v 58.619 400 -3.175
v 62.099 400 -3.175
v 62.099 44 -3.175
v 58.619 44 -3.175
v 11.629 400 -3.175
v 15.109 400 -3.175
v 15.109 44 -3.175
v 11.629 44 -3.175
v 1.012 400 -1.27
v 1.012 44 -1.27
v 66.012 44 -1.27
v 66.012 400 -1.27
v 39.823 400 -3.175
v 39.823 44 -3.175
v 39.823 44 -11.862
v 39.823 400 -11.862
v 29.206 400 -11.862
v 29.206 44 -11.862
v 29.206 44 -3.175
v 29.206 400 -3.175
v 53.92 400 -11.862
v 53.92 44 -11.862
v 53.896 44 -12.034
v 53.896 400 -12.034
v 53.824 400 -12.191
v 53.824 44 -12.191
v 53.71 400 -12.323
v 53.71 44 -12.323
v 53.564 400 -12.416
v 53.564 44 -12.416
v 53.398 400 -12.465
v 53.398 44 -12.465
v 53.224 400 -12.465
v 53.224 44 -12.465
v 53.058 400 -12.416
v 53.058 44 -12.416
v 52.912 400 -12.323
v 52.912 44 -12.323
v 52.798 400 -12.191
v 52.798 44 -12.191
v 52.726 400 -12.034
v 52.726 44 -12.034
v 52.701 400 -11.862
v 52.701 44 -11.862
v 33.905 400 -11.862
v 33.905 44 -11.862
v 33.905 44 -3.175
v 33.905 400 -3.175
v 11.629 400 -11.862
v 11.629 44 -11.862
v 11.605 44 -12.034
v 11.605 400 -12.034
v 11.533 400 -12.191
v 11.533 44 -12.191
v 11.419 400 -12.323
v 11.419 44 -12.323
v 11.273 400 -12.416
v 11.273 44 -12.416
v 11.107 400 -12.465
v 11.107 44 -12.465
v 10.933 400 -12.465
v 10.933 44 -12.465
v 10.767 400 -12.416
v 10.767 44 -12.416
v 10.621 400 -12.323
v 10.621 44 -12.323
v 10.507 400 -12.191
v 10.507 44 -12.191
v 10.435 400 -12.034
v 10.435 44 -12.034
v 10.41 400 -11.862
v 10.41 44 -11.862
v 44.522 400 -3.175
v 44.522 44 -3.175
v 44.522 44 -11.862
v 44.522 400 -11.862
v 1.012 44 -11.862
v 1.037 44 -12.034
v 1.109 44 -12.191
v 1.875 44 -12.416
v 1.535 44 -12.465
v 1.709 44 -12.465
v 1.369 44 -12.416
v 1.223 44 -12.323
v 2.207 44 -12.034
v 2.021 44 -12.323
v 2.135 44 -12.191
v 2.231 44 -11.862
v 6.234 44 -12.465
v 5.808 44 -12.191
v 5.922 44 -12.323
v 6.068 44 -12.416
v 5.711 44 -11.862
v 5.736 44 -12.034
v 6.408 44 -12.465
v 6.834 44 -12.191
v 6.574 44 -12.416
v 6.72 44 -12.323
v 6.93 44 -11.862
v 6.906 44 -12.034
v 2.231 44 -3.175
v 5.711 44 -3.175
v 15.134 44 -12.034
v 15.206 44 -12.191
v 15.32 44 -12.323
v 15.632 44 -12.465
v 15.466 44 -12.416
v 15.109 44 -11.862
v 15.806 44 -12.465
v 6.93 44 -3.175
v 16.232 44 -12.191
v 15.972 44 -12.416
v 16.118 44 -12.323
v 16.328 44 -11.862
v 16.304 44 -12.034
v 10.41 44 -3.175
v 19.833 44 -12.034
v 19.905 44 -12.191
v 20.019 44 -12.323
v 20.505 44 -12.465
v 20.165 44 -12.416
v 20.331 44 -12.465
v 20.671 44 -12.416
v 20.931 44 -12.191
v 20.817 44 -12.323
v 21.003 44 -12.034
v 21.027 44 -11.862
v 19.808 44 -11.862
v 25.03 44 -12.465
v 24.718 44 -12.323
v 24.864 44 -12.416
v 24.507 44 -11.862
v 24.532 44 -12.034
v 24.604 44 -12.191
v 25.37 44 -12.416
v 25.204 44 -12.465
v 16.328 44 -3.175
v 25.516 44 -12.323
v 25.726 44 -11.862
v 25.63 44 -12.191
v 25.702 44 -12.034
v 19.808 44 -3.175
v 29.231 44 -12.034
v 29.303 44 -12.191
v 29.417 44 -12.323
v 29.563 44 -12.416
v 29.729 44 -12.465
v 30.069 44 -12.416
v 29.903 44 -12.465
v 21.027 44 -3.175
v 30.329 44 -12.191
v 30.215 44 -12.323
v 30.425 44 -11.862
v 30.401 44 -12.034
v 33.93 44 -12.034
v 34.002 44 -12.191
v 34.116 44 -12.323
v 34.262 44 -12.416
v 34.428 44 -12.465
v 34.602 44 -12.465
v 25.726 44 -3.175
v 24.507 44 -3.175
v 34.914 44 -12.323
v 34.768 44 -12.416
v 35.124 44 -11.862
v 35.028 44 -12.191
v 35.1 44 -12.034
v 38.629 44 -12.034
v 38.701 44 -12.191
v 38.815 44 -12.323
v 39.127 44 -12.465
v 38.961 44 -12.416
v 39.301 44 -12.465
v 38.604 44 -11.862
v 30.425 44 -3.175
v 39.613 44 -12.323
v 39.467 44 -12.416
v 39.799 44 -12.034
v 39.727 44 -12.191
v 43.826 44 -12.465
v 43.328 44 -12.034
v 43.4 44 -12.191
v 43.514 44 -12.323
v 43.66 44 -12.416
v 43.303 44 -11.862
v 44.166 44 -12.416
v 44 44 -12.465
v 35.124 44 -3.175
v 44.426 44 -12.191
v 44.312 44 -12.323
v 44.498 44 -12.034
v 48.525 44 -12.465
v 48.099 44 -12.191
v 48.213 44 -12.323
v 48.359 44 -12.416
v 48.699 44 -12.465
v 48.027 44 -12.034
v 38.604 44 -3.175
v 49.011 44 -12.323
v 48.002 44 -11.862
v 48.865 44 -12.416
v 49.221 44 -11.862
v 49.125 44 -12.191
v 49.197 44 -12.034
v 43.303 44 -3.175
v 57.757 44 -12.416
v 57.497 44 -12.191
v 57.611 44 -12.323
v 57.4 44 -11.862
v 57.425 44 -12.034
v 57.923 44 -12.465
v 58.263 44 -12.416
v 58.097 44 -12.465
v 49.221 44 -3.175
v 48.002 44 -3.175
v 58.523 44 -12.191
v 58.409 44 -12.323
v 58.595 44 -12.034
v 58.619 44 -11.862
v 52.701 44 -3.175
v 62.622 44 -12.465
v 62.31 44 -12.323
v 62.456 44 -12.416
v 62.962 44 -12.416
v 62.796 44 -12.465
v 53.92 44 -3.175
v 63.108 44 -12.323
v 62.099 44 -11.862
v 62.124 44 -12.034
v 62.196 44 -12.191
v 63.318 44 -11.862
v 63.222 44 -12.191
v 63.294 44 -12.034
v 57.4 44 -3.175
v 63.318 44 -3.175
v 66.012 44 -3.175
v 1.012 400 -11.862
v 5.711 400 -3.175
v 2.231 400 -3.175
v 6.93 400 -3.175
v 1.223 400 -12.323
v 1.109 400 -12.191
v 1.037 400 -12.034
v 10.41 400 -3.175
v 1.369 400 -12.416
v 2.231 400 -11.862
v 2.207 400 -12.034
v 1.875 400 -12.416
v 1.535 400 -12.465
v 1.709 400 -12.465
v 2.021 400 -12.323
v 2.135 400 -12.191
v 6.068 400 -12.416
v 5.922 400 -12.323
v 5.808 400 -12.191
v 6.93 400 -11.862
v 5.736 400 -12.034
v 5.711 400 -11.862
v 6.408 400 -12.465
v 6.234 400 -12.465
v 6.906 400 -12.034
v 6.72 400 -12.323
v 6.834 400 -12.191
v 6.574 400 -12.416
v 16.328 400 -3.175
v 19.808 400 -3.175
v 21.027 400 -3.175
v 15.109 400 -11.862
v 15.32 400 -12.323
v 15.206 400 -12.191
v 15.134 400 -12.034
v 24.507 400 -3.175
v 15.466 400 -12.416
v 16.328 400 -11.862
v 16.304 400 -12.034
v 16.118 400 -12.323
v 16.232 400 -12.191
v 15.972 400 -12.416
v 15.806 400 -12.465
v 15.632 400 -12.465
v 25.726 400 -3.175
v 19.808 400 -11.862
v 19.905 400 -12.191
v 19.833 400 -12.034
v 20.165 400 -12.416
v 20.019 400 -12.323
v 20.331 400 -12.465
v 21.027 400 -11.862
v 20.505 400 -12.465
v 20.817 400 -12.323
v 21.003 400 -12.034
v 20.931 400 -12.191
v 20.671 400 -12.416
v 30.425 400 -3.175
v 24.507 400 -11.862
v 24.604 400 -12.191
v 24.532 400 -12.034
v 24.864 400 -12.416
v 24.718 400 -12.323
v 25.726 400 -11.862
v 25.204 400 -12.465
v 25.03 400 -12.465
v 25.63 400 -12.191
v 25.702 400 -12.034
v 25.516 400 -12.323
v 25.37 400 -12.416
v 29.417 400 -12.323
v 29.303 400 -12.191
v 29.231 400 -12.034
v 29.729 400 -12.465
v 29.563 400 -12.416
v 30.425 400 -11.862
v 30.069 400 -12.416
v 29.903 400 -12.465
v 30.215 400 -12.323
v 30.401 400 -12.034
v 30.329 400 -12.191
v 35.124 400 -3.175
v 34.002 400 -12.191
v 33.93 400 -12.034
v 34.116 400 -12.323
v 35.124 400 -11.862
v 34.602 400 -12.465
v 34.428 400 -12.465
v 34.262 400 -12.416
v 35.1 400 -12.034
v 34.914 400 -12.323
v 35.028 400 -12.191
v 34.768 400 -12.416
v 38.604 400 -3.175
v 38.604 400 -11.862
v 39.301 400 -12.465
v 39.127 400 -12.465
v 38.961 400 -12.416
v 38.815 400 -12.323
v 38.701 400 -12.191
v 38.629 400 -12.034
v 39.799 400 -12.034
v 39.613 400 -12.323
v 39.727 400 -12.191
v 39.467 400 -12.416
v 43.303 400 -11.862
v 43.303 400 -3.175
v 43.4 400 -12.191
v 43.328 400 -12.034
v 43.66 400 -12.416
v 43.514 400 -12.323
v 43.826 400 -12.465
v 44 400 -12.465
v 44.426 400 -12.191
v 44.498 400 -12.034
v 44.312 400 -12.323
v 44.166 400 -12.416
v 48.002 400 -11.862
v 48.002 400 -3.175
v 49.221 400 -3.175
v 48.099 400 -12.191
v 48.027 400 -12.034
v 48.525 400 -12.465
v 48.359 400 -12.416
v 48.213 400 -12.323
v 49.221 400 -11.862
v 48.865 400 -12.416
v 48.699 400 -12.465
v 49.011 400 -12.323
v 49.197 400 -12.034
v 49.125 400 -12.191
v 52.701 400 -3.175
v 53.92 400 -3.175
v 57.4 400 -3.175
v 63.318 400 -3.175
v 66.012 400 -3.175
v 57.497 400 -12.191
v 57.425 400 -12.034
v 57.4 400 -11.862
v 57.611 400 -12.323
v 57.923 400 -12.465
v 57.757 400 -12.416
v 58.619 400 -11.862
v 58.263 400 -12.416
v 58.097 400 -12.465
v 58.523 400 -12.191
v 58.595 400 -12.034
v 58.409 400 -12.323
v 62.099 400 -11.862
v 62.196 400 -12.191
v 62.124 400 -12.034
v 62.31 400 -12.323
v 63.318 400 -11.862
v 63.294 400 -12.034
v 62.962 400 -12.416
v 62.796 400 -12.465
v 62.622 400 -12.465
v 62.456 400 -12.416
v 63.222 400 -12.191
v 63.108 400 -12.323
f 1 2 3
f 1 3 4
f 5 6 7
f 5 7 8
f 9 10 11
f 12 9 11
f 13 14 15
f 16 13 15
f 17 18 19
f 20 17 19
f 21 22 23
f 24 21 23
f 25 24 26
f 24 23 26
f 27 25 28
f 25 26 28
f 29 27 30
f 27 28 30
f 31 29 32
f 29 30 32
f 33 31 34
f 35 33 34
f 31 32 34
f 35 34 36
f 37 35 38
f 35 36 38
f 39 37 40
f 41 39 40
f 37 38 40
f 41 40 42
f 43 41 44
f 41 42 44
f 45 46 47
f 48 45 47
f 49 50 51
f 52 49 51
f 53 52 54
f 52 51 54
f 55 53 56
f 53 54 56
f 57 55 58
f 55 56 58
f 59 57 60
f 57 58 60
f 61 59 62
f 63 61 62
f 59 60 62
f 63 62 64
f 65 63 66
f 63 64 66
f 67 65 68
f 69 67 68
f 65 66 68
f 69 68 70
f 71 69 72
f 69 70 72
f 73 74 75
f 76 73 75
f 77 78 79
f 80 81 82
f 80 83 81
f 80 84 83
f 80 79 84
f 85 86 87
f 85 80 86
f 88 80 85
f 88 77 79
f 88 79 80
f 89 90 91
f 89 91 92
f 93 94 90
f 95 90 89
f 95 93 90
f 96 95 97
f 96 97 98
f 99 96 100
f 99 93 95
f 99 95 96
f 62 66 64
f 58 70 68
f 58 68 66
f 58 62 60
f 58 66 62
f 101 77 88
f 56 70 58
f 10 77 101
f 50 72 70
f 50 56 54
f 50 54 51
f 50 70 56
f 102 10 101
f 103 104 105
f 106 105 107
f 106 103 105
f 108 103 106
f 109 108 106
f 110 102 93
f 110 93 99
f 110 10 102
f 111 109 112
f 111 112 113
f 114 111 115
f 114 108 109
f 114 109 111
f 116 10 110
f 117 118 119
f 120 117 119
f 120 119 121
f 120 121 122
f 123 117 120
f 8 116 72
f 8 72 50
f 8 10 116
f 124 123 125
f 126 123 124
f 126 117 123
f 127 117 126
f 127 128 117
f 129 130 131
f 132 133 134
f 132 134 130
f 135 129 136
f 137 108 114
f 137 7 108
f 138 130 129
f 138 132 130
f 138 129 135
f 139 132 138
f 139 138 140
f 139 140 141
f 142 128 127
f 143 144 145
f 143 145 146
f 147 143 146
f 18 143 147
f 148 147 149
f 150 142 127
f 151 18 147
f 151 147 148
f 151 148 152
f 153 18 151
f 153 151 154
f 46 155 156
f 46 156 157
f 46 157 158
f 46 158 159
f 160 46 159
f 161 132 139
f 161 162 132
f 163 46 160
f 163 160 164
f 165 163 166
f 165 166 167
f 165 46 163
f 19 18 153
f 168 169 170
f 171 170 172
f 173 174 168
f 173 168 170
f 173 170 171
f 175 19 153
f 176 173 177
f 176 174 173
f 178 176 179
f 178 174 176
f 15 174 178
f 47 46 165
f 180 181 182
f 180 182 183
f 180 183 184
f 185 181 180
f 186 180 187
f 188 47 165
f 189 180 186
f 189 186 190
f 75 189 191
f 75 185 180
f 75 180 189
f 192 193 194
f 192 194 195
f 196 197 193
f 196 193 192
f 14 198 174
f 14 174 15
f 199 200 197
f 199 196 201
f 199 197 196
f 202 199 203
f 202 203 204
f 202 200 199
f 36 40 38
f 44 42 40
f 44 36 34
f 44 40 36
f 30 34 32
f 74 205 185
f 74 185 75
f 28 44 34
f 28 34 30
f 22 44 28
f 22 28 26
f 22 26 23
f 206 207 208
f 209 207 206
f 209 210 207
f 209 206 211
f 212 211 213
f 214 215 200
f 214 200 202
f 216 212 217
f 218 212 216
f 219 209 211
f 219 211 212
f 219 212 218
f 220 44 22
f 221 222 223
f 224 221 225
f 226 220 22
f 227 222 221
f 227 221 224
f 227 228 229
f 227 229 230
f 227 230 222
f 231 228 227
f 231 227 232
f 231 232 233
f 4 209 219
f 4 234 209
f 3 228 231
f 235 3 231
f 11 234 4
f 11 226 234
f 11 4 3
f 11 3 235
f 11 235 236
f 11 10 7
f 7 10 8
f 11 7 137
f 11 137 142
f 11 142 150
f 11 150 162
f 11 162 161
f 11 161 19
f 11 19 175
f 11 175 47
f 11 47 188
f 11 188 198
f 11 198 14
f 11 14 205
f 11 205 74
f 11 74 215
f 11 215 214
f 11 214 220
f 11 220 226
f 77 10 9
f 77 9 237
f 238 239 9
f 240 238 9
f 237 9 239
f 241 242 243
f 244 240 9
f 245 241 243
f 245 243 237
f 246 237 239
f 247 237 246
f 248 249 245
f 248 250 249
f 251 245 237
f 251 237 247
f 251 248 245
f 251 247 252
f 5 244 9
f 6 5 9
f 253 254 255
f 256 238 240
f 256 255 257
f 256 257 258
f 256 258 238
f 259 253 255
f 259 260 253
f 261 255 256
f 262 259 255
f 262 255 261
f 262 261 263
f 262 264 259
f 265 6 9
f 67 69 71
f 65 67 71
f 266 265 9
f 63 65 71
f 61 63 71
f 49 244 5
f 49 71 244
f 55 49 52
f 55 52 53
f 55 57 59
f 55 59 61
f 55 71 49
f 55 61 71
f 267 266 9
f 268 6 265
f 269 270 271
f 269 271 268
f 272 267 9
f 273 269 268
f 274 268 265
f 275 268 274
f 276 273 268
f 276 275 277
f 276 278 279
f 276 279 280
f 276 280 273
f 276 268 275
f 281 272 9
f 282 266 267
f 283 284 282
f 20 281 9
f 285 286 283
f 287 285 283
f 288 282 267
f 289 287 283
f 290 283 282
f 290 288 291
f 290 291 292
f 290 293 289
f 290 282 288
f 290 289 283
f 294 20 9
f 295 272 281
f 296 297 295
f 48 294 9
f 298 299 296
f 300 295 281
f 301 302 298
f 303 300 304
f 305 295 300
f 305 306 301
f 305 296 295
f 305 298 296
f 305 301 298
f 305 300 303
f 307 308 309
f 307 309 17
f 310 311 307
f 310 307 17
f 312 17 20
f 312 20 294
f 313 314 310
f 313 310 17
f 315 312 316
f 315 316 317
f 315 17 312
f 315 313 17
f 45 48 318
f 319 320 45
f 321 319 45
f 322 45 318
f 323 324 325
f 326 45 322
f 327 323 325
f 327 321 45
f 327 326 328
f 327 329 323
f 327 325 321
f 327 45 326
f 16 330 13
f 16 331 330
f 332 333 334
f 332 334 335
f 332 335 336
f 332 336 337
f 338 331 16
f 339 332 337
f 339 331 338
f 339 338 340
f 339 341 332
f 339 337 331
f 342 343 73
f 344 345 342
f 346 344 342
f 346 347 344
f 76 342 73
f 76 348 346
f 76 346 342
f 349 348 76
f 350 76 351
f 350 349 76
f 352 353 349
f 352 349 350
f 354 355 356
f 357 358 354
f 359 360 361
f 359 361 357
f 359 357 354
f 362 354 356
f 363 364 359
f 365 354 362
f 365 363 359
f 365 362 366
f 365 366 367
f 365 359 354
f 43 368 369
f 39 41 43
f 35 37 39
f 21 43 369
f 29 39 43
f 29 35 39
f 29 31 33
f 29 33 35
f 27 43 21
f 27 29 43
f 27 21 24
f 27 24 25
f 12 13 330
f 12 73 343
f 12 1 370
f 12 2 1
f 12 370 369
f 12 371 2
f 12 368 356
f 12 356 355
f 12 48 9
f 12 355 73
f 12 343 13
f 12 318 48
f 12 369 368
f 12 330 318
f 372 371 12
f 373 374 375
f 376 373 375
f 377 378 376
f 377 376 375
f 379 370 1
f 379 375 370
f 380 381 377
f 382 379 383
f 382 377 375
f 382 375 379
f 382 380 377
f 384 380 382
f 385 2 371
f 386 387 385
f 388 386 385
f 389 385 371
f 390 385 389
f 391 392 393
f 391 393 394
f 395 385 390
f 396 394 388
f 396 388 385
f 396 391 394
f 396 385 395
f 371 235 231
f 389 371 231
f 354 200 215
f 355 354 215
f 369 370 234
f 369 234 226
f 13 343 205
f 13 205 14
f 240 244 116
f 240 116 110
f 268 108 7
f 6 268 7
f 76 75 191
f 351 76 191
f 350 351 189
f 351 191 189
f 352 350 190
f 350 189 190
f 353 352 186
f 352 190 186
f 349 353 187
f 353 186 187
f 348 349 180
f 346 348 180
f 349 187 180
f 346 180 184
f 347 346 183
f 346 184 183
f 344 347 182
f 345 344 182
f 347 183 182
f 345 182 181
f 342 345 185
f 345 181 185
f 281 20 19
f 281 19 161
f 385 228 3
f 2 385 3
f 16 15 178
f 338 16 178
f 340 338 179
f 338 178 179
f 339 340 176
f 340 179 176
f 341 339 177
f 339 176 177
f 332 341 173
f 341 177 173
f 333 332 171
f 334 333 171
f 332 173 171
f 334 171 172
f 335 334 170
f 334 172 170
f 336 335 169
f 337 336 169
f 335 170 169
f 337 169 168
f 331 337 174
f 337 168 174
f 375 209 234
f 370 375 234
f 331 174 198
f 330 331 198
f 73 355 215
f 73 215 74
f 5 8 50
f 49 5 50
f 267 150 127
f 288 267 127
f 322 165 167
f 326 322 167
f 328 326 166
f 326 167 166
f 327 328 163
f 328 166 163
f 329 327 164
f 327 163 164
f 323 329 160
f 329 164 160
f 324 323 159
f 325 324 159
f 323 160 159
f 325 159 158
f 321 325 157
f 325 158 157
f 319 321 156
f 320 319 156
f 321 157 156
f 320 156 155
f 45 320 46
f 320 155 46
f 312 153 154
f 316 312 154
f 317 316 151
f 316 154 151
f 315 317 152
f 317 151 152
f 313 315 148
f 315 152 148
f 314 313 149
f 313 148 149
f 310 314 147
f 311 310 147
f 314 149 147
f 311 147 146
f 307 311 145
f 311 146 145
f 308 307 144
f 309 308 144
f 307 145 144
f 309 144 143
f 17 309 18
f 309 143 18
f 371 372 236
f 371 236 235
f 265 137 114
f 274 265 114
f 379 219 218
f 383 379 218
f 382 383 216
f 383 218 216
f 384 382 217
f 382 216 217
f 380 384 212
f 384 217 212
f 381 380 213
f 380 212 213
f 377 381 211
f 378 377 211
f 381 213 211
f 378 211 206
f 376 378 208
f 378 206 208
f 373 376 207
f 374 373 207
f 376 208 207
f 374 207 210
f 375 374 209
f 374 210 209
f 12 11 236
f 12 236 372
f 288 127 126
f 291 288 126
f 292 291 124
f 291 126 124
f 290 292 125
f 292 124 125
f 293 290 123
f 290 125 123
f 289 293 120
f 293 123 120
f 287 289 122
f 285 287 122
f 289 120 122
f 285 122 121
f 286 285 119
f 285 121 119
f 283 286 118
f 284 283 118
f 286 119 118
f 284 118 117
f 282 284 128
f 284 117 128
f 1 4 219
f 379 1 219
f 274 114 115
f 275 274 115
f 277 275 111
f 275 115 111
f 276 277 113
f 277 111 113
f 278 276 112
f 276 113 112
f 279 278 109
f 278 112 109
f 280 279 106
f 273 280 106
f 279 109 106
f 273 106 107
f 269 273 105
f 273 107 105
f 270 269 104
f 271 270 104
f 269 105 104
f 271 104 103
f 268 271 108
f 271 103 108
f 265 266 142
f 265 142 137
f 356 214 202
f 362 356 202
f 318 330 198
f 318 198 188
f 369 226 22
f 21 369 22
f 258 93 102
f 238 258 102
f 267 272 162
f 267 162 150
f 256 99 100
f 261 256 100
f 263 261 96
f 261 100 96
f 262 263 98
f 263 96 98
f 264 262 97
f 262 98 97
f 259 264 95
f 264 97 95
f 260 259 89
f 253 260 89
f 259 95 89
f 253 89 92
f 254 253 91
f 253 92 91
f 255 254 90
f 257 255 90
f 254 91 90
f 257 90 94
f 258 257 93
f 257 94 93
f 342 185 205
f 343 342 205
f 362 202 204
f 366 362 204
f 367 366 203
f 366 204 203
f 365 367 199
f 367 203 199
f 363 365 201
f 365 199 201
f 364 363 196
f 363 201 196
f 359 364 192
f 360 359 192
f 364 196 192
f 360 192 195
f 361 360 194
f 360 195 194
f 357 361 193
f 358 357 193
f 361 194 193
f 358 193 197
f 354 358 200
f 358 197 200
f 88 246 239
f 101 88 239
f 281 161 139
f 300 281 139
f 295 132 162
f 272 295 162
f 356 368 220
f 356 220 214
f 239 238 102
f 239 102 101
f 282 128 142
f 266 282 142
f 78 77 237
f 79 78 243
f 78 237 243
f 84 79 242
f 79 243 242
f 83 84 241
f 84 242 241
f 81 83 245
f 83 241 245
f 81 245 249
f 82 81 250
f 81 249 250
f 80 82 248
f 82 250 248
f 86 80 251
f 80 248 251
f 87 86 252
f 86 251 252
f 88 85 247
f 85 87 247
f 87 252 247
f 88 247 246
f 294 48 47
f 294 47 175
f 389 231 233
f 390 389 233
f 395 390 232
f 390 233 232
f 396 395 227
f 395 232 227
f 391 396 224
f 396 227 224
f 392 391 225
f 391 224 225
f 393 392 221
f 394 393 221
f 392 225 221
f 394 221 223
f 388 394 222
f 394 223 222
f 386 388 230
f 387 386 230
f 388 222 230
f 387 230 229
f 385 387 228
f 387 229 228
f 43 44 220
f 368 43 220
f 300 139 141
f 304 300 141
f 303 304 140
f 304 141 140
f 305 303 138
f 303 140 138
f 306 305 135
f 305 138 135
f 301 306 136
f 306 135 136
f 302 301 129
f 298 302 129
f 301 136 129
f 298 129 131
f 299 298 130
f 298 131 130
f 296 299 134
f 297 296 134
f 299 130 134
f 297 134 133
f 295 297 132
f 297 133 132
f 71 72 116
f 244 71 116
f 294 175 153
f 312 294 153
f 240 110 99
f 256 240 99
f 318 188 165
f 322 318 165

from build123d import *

# Parameters (mm, degrees)
BOSS_EXTRUDE1_DEPTH   = 400
BOSS_EXTRUDE2_DEPTH   = 400
SKETCH_PATTERN1_DEPTH = 400
SKETCH5_W             = 0.4826
SKETCH5_H             = 3.175
BOSS_EXTRUDE3_DEPTH   = 350
SKETCH10_OUTSIDE_W    = 295.048
SKETCH10_OUTSIDE_H    = 491.772
SKETCH10_OUTSIDE_W_2  = 65
SKETCH10_OUTSIDE_H_2  = 400
CUT_EXTRUDE3_DEPTH    = 450.320924212
SKETCH11_OUTSIDE_W    = 148.088
SKETCH11_OUTSIDE_H    = 483.088
SKETCH11_OUTSIDE_W_2  = 65
SKETCH11_OUTSIDE_H_2  = 356
CUT_EXTRUDE4_DEPTH    = 406.602204808
SKETCH12_W            = 65
SKETCH12_H            = 356
CUT_EXTRUDE5_DEPTH    = 1.27


# Read off the part's stored shape, not the designer's step: Sketch-Pattern1
with BuildPart() as part:
    # Sketch1 → Boss-Extrude1 (new body)
    with BuildSketch(Plane(origin=(0, 0, 0), x_dir=(1, 0, 0), z_dir=(0, 1, 0))):
        Polygon((1.012216501, 3.175), (1.012216501, 0), (203.805816501, 0), (203.805816501, 3.175), (2.231416501, 3.175), align=None)
    extrude(amount=BOSS_EXTRUDE1_DEPTH)

    # Sketch3 → Boss-Extrude2 (add, through all)
    with BuildSketch(Plane(origin=(0, 400, 0), x_dir=(1, 0, 0), z_dir=(0, 1, 0))):
        with BuildLine():
            Line((1.012216501, 3.175), (1.012216501, 11.8618))
            ThreePointArc((1.012216501, 11.8618), (1.621816501, 12.4714), (2.231416501, 11.8618))
            Line((2.231416501, 11.8618), (2.231416501, 3.175))
            Line((2.231416501, 3.175), (1.012216501, 3.175))
        make_face()
    extrude(amount=-BOSS_EXTRUDE2_DEPTH)

    # Sketch-Pattern1 outline → Sketch-Pattern1 (add)
    with BuildSketch(Plane(origin=(0, 0, 0), x_dir=(1, 0, 0), z_dir=(0, 1, 0))):
        with BuildLine():
            Line((6.930416501, 3.175), (6.930416501, 11.8618))
            ThreePointArc((6.930416501, 11.8618), (6.320816501, 12.4714), (5.711216501, 11.8618))
            Line((5.711216501, 11.8618), (5.711216501, 3.175))
            Line((5.711216501, 3.175), (6.930416501, 3.175))
        make_face()
        with BuildLine():
            Line((203.069216501, 11.8618), (203.069216501, 3.175))
            Line((203.069216501, 3.175), (204.288416501, 3.175))
            Line((204.288416501, 3.175), (204.288416501, 11.8618))
            ThreePointArc((204.288416501, 11.8618), (203.678816501, 12.4714), (203.069216501, 11.8618))
        make_face()
        with BuildLine():
            Line((198.370216501, 11.8618), (198.370216501, 3.175))
            Line((198.370216501, 3.175), (199.589416501, 3.175))
            Line((199.589416501, 3.175), (199.589416501, 11.8618))
            ThreePointArc((199.589416501, 11.8618), (198.979816501, 12.4714), (198.370216501, 11.8618))
        make_face()
        with BuildLine():
            Line((193.671216501, 11.8618), (193.671216501, 3.175))
            Line((193.671216501, 3.175), (194.890416501, 3.175))
            Line((194.890416501, 3.175), (194.890416501, 11.8618))
            ThreePointArc((194.890416501, 11.8618), (194.280816501, 12.4714), (193.671216501, 11.8618))
        make_face()
        with BuildLine():
            Line((188.972216501, 11.8618), (188.972216501, 3.175))
            Line((188.972216501, 3.175), (190.191416501, 3.175))
            Line((190.191416501, 3.175), (190.191416501, 11.8618))
            ThreePointArc((190.191416501, 11.8618), (189.581816501, 12.4714), (188.972216501, 11.8618))
        make_face()
        with BuildLine():
            Line((184.273216501, 11.8618), (184.273216501, 3.175))
            Line((184.273216501, 3.175), (185.492416501, 3.175))
            Line((185.492416501, 3.175), (185.492416501, 11.8618))
            ThreePointArc((185.492416501, 11.8618), (184.882816501, 12.4714), (184.273216501, 11.8618))
        make_face()
        with BuildLine():
            Line((179.574216501, 11.8618), (179.574216501, 3.175))
            Line((179.574216501, 3.175), (180.793416501, 3.175))
            Line((180.793416501, 3.175), (180.793416501, 11.8618))
            ThreePointArc((180.793416501, 11.8618), (180.183816501, 12.4714), (179.574216501, 11.8618))
        make_face()
        with BuildLine():
            Line((174.875216501, 11.8618), (174.875216501, 3.175))
            Line((174.875216501, 3.175), (176.094416501, 3.175))
            Line((176.094416501, 3.175), (176.094416501, 11.8618))
            ThreePointArc((176.094416501, 11.8618), (175.484816501, 12.4714), (174.875216501, 11.8618))
        make_face()
        with BuildLine():
            Line((170.176216501, 11.8618), (170.176216501, 3.175))
            Line((170.176216501, 3.175), (171.395416501, 3.175))
            Line((171.395416501, 3.175), (171.395416501, 11.8618))
            ThreePointArc((171.395416501, 11.8618), (170.785816501, 12.4714), (170.176216501, 11.8618))
        make_face()
        with BuildLine():
            Line((165.477216501, 11.8618), (165.477216501, 3.175))
            Line((165.477216501, 3.175), (166.696416501, 3.175))
            Line((166.696416501, 3.175), (166.696416501, 11.8618))
            ThreePointArc((166.696416501, 11.8618), (166.086816501, 12.4714), (165.477216501, 11.8618))
        make_face()
        with BuildLine():
            Line((160.778216501, 11.8618), (160.778216501, 3.175))
            Line((160.778216501, 3.175), (161.997416501, 3.175))
            Line((161.997416501, 3.175), (161.997416501, 11.8618))
            ThreePointArc((161.997416501, 11.8618), (161.387816501, 12.4714), (160.778216501, 11.8618))
        make_face()
        with BuildLine():
            Line((156.079216501, 11.8618), (156.079216501, 3.175))
            Line((156.079216501, 3.175), (157.298416501, 3.175))
            Line((157.298416501, 3.175), (157.298416501, 11.8618))
            ThreePointArc((157.298416501, 11.8618), (156.688816501, 12.4714), (156.079216501, 11.8618))
        make_face()
        with BuildLine():
            Line((151.380216501, 11.8618), (151.380216501, 3.175))
            Line((151.380216501, 3.175), (152.599416501, 3.175))
            Line((152.599416501, 3.175), (152.599416501, 11.8618))
            ThreePointArc((152.599416501, 11.8618), (151.989816501, 12.4714), (151.380216501, 11.8618))
        make_face()
        with BuildLine():
            Line((146.681216501, 11.8618), (146.681216501, 3.175))
            Line((146.681216501, 3.175), (147.900416501, 3.175))
            Line((147.900416501, 3.175), (147.900416501, 11.8618))
            ThreePointArc((147.900416501, 11.8618), (147.290816501, 12.4714), (146.681216501, 11.8618))
        make_face()
        with BuildLine():
            Line((141.982216501, 11.8618), (141.982216501, 3.175))
            Line((141.982216501, 3.175), (143.201416501, 3.175))
            Line((143.201416501, 3.175), (143.201416501, 11.8618))
            ThreePointArc((143.201416501, 11.8618), (142.591816501, 12.4714), (141.982216501, 11.8618))
        make_face()
        with BuildLine():
            Line((137.283216501, 11.8618), (137.283216501, 3.175))
            Line((137.283216501, 3.175), (138.502416501, 3.175))
            Line((138.502416501, 3.175), (138.502416501, 11.8618))
            ThreePointArc((138.502416501, 11.8618), (137.892816501, 12.4714), (137.283216501, 11.8618))
        make_face()
        with BuildLine():
            Line((132.584216501, 11.8618), (132.584216501, 3.175))
            Line((132.584216501, 3.175), (133.803416501, 3.175))
            Line((133.803416501, 3.175), (133.803416501, 11.8618))
            ThreePointArc((133.803416501, 11.8618), (133.193816501, 12.4714), (132.584216501, 11.8618))
        make_face()
        with BuildLine():
            Line((127.885216501, 11.8618), (127.885216501, 3.175))
            Line((127.885216501, 3.175), (129.104416501, 3.175))
            Line((129.104416501, 3.175), (129.104416501, 11.8618))
            ThreePointArc((129.104416501, 11.8618), (128.494816501, 12.4714), (127.885216501, 11.8618))
        make_face()
        with BuildLine():
            Line((123.186216501, 11.8618), (123.186216501, 3.175))
            Line((123.186216501, 3.175), (124.405416501, 3.175))
            Line((124.405416501, 3.175), (124.405416501, 11.8618))
            ThreePointArc((124.405416501, 11.8618), (123.795816501, 12.4714), (123.186216501, 11.8618))
        make_face()
        with BuildLine():
            Line((118.487216501, 11.8618), (118.487216501, 3.175))
            Line((118.487216501, 3.175), (119.706416501, 3.175))
            Line((119.706416501, 3.175), (119.706416501, 11.8618))
            ThreePointArc((119.706416501, 11.8618), (119.096816501, 12.4714), (118.487216501, 11.8618))
        make_face()
        with BuildLine():
            Line((113.788216501, 11.8618), (113.788216501, 3.175))
            Line((113.788216501, 3.175), (115.007416501, 3.175))
            Line((115.007416501, 3.175), (115.007416501, 11.8618))
            ThreePointArc((115.007416501, 11.8618), (114.397816501, 12.4714), (113.788216501, 11.8618))
        make_face()
        with BuildLine():
            Line((109.089216501, 11.8618), (109.089216501, 3.175))
            Line((109.089216501, 3.175), (110.308416501, 3.175))
            Line((110.308416501, 3.175), (110.308416501, 11.8618))
            ThreePointArc((110.308416501, 11.8618), (109.698816501, 12.4714), (109.089216501, 11.8618))
        make_face()
        with BuildLine():
            Line((104.390216501, 11.8618), (104.390216501, 3.175))
            Line((104.390216501, 3.175), (105.609416501, 3.175))
            Line((105.609416501, 3.175), (105.609416501, 11.8618))
            ThreePointArc((105.609416501, 11.8618), (104.999816501, 12.4714), (104.390216501, 11.8618))
        make_face()
        with BuildLine():
            Line((99.691216501, 11.8618), (99.691216501, 3.175))
            Line((99.691216501, 3.175), (100.910416501, 3.175))
            Line((100.910416501, 3.175), (100.910416501, 11.8618))
            ThreePointArc((100.910416501, 11.8618), (100.300816501, 12.4714), (99.691216501, 11.8618))
        make_face()
        with BuildLine():
            Line((94.992216501, 11.8618), (94.992216501, 3.175))
            Line((94.992216501, 3.175), (96.211416501, 3.175))
            Line((96.211416501, 3.175), (96.211416501, 11.8618))
            ThreePointArc((96.211416501, 11.8618), (95.601816501, 12.4714), (94.992216501, 11.8618))
        make_face()
        with BuildLine():
            Line((90.293216501, 11.8618), (90.293216501, 3.175))
            Line((90.293216501, 3.175), (91.512416501, 3.175))
            Line((91.512416501, 3.175), (91.512416501, 11.8618))
            ThreePointArc((91.512416501, 11.8618), (90.902816501, 12.4714), (90.293216501, 11.8618))
        make_face()
        with BuildLine():
            Line((85.594216501, 11.8618), (85.594216501, 3.175))
            Line((85.594216501, 3.175), (86.813416501, 3.175))
            Line((86.813416501, 3.175), (86.813416501, 11.8618))
            ThreePointArc((86.813416501, 11.8618), (86.203816501, 12.4714), (85.594216501, 11.8618))
        make_face()
        with BuildLine():
            Line((80.895216501, 11.8618), (80.895216501, 3.175))
            Line((80.895216501, 3.175), (82.114416501, 3.175))
            Line((82.114416501, 3.175), (82.114416501, 11.8618))
            ThreePointArc((82.114416501, 11.8618), (81.504816501, 12.4714), (80.895216501, 11.8618))
        make_face()
        with BuildLine():
            Line((76.196216501, 11.8618), (76.196216501, 3.175))
            Line((76.196216501, 3.175), (77.415416501, 3.175))
            Line((77.415416501, 3.175), (77.415416501, 11.8618))
            ThreePointArc((77.415416501, 11.8618), (76.805816501, 12.4714), (76.196216501, 11.8618))
        make_face()
        with BuildLine():
            Line((71.497216501, 11.8618), (71.497216501, 3.175))
            Line((71.497216501, 3.175), (72.716416501, 3.175))
            Line((72.716416501, 3.175), (72.716416501, 11.8618))
            ThreePointArc((72.716416501, 11.8618), (72.106816501, 12.4714), (71.497216501, 11.8618))
        make_face()
        with BuildLine():
            Line((66.798216501, 11.8618), (66.798216501, 3.175))
            Line((66.798216501, 3.175), (68.017416501, 3.175))
            Line((68.017416501, 3.175), (68.017416501, 11.8618))
            ThreePointArc((68.017416501, 11.8618), (67.407816501, 12.4714), (66.798216501, 11.8618))
        make_face()
        with BuildLine():
            Line((62.099216501, 11.8618), (62.099216501, 3.175))
            Line((62.099216501, 3.175), (63.318416501, 3.175))
            Line((63.318416501, 3.175), (63.318416501, 11.8618))
            ThreePointArc((63.318416501, 11.8618), (62.708816501, 12.4714), (62.099216501, 11.8618))
        make_face()
        with BuildLine():
            Line((57.400216501, 11.8618), (57.400216501, 3.175))
            Line((57.400216501, 3.175), (58.619416501, 3.175))
            Line((58.619416501, 3.175), (58.619416501, 11.8618))
            ThreePointArc((58.619416501, 11.8618), (58.009816501, 12.4714), (57.400216501, 11.8618))
        make_face()
        with BuildLine():
            Line((52.701216501, 11.8618), (52.701216501, 3.175))
            Line((52.701216501, 3.175), (53.920416501, 3.175))
            Line((53.920416501, 3.175), (53.920416501, 11.8618))
            ThreePointArc((53.920416501, 11.8618), (53.310816501, 12.4714), (52.701216501, 11.8618))
        make_face()
        with BuildLine():
            Line((48.002216501, 11.8618), (48.002216501, 3.175))
            Line((48.002216501, 3.175), (49.221416501, 3.175))
            Line((49.221416501, 3.175), (49.221416501, 11.8618))
            ThreePointArc((49.221416501, 11.8618), (48.611816501, 12.4714), (48.002216501, 11.8618))
        make_face()
        with BuildLine():
            Line((43.303216501, 11.8618), (43.303216501, 3.175))
            Line((43.303216501, 3.175), (44.522416501, 3.175))
            Line((44.522416501, 3.175), (44.522416501, 11.8618))
            ThreePointArc((44.522416501, 11.8618), (43.912816501, 12.4714), (43.303216501, 11.8618))
        make_face()
        with BuildLine():
            Line((38.604216501, 11.8618), (38.604216501, 3.175))
            Line((38.604216501, 3.175), (39.823416501, 3.175))
            Line((39.823416501, 3.175), (39.823416501, 11.8618))
            ThreePointArc((39.823416501, 11.8618), (39.213816501, 12.4714), (38.604216501, 11.8618))
        make_face()
        with BuildLine():
            Line((33.905216501, 11.8618), (33.905216501, 3.175))
            Line((33.905216501, 3.175), (35.124416501, 3.175))
            Line((35.124416501, 3.175), (35.124416501, 11.8618))
            ThreePointArc((35.124416501, 11.8618), (34.514816501, 12.4714), (33.905216501, 11.8618))
        make_face()
        with BuildLine():
            Line((29.206216501, 11.8618), (29.206216501, 3.175))
            Line((29.206216501, 3.175), (30.425416501, 3.175))
            Line((30.425416501, 3.175), (30.425416501, 11.8618))
            ThreePointArc((30.425416501, 11.8618), (29.815816501, 12.4714), (29.206216501, 11.8618))
        make_face()
        with BuildLine():
            Line((24.507216501, 11.8618), (24.507216501, 3.175))
            Line((24.507216501, 3.175), (25.726416501, 3.175))
            Line((25.726416501, 3.175), (25.726416501, 11.8618))
            ThreePointArc((25.726416501, 11.8618), (25.116816501, 12.4714), (24.507216501, 11.8618))
        make_face()
        with BuildLine():
            Line((19.808216501, 11.8618), (19.808216501, 3.175))
            Line((19.808216501, 3.175), (21.027416501, 3.175))
            Line((21.027416501, 3.175), (21.027416501, 11.8618))
            ThreePointArc((21.027416501, 11.8618), (20.417816501, 12.4714), (19.808216501, 11.8618))
        make_face()
        with BuildLine():
            Line((15.109216501, 11.8618), (15.109216501, 3.175))
            Line((15.109216501, 3.175), (16.328416501, 3.175))
            Line((16.328416501, 3.175), (16.328416501, 11.8618))
            ThreePointArc((16.328416501, 11.8618), (15.718816501, 12.4714), (15.109216501, 11.8618))
        make_face()
        with BuildLine():
            Line((10.410216501, 11.8618), (10.410216501, 3.175))
            Line((10.410216501, 3.175), (11.629416501, 3.175))
            Line((11.629416501, 3.175), (11.629416501, 11.8618))
            ThreePointArc((11.629416501, 11.8618), (11.019816501, 12.4714), (10.410216501, 11.8618))
        make_face()
    extrude(amount=SKETCH_PATTERN1_DEPTH)

    # Sketch5 → Boss-Extrude3 (add)
    with BuildSketch(Plane(origin=(0, 400, 0), x_dir=(1, 0, 0), z_dir=(0, 1, 0))):
        with Locations((204.047116501, 1.5875)):
            Rectangle(SKETCH5_W, SKETCH5_H)
    extrude(amount=-BOSS_EXTRUDE3_DEPTH)

    # Sketch10 outside → Cut-Extrude3 (cut, through all)
    with BuildSketch(Plane.XY):
        with Locations((102.65, 200)):
            Rectangle(SKETCH10_OUTSIDE_W, SKETCH10_OUTSIDE_H)
        with Locations((33.512216501, 200)):
            Rectangle(SKETCH10_OUTSIDE_W_2, SKETCH10_OUTSIDE_H_2, mode=Mode.SUBTRACT)
    extrude(amount=-CUT_EXTRUDE3_DEPTH, mode=Mode.SUBTRACT)

    # Sketch11 outside → Cut-Extrude4 (cut, through all)
    with BuildSketch(Plane.XY):
        with Locations((33.512, 200)):
            Rectangle(SKETCH11_OUTSIDE_W, SKETCH11_OUTSIDE_H)
        with Locations((33.512216501, 222)):
            Rectangle(SKETCH11_OUTSIDE_W_2, SKETCH11_OUTSIDE_H_2, mode=Mode.SUBTRACT)
    extrude(amount=-CUT_EXTRUDE4_DEPTH, mode=Mode.SUBTRACT)

    # Sketch12 → Cut-Extrude5 (cut)
    with BuildSketch(Plane.XY):
        with Locations((33.512216501, 222)):
            Rectangle(SKETCH12_W, SKETCH12_H)
    extrude(amount=-CUT_EXTRUDE5_DEPTH, mode=Mode.SUBTRACT)


solid = part.part
